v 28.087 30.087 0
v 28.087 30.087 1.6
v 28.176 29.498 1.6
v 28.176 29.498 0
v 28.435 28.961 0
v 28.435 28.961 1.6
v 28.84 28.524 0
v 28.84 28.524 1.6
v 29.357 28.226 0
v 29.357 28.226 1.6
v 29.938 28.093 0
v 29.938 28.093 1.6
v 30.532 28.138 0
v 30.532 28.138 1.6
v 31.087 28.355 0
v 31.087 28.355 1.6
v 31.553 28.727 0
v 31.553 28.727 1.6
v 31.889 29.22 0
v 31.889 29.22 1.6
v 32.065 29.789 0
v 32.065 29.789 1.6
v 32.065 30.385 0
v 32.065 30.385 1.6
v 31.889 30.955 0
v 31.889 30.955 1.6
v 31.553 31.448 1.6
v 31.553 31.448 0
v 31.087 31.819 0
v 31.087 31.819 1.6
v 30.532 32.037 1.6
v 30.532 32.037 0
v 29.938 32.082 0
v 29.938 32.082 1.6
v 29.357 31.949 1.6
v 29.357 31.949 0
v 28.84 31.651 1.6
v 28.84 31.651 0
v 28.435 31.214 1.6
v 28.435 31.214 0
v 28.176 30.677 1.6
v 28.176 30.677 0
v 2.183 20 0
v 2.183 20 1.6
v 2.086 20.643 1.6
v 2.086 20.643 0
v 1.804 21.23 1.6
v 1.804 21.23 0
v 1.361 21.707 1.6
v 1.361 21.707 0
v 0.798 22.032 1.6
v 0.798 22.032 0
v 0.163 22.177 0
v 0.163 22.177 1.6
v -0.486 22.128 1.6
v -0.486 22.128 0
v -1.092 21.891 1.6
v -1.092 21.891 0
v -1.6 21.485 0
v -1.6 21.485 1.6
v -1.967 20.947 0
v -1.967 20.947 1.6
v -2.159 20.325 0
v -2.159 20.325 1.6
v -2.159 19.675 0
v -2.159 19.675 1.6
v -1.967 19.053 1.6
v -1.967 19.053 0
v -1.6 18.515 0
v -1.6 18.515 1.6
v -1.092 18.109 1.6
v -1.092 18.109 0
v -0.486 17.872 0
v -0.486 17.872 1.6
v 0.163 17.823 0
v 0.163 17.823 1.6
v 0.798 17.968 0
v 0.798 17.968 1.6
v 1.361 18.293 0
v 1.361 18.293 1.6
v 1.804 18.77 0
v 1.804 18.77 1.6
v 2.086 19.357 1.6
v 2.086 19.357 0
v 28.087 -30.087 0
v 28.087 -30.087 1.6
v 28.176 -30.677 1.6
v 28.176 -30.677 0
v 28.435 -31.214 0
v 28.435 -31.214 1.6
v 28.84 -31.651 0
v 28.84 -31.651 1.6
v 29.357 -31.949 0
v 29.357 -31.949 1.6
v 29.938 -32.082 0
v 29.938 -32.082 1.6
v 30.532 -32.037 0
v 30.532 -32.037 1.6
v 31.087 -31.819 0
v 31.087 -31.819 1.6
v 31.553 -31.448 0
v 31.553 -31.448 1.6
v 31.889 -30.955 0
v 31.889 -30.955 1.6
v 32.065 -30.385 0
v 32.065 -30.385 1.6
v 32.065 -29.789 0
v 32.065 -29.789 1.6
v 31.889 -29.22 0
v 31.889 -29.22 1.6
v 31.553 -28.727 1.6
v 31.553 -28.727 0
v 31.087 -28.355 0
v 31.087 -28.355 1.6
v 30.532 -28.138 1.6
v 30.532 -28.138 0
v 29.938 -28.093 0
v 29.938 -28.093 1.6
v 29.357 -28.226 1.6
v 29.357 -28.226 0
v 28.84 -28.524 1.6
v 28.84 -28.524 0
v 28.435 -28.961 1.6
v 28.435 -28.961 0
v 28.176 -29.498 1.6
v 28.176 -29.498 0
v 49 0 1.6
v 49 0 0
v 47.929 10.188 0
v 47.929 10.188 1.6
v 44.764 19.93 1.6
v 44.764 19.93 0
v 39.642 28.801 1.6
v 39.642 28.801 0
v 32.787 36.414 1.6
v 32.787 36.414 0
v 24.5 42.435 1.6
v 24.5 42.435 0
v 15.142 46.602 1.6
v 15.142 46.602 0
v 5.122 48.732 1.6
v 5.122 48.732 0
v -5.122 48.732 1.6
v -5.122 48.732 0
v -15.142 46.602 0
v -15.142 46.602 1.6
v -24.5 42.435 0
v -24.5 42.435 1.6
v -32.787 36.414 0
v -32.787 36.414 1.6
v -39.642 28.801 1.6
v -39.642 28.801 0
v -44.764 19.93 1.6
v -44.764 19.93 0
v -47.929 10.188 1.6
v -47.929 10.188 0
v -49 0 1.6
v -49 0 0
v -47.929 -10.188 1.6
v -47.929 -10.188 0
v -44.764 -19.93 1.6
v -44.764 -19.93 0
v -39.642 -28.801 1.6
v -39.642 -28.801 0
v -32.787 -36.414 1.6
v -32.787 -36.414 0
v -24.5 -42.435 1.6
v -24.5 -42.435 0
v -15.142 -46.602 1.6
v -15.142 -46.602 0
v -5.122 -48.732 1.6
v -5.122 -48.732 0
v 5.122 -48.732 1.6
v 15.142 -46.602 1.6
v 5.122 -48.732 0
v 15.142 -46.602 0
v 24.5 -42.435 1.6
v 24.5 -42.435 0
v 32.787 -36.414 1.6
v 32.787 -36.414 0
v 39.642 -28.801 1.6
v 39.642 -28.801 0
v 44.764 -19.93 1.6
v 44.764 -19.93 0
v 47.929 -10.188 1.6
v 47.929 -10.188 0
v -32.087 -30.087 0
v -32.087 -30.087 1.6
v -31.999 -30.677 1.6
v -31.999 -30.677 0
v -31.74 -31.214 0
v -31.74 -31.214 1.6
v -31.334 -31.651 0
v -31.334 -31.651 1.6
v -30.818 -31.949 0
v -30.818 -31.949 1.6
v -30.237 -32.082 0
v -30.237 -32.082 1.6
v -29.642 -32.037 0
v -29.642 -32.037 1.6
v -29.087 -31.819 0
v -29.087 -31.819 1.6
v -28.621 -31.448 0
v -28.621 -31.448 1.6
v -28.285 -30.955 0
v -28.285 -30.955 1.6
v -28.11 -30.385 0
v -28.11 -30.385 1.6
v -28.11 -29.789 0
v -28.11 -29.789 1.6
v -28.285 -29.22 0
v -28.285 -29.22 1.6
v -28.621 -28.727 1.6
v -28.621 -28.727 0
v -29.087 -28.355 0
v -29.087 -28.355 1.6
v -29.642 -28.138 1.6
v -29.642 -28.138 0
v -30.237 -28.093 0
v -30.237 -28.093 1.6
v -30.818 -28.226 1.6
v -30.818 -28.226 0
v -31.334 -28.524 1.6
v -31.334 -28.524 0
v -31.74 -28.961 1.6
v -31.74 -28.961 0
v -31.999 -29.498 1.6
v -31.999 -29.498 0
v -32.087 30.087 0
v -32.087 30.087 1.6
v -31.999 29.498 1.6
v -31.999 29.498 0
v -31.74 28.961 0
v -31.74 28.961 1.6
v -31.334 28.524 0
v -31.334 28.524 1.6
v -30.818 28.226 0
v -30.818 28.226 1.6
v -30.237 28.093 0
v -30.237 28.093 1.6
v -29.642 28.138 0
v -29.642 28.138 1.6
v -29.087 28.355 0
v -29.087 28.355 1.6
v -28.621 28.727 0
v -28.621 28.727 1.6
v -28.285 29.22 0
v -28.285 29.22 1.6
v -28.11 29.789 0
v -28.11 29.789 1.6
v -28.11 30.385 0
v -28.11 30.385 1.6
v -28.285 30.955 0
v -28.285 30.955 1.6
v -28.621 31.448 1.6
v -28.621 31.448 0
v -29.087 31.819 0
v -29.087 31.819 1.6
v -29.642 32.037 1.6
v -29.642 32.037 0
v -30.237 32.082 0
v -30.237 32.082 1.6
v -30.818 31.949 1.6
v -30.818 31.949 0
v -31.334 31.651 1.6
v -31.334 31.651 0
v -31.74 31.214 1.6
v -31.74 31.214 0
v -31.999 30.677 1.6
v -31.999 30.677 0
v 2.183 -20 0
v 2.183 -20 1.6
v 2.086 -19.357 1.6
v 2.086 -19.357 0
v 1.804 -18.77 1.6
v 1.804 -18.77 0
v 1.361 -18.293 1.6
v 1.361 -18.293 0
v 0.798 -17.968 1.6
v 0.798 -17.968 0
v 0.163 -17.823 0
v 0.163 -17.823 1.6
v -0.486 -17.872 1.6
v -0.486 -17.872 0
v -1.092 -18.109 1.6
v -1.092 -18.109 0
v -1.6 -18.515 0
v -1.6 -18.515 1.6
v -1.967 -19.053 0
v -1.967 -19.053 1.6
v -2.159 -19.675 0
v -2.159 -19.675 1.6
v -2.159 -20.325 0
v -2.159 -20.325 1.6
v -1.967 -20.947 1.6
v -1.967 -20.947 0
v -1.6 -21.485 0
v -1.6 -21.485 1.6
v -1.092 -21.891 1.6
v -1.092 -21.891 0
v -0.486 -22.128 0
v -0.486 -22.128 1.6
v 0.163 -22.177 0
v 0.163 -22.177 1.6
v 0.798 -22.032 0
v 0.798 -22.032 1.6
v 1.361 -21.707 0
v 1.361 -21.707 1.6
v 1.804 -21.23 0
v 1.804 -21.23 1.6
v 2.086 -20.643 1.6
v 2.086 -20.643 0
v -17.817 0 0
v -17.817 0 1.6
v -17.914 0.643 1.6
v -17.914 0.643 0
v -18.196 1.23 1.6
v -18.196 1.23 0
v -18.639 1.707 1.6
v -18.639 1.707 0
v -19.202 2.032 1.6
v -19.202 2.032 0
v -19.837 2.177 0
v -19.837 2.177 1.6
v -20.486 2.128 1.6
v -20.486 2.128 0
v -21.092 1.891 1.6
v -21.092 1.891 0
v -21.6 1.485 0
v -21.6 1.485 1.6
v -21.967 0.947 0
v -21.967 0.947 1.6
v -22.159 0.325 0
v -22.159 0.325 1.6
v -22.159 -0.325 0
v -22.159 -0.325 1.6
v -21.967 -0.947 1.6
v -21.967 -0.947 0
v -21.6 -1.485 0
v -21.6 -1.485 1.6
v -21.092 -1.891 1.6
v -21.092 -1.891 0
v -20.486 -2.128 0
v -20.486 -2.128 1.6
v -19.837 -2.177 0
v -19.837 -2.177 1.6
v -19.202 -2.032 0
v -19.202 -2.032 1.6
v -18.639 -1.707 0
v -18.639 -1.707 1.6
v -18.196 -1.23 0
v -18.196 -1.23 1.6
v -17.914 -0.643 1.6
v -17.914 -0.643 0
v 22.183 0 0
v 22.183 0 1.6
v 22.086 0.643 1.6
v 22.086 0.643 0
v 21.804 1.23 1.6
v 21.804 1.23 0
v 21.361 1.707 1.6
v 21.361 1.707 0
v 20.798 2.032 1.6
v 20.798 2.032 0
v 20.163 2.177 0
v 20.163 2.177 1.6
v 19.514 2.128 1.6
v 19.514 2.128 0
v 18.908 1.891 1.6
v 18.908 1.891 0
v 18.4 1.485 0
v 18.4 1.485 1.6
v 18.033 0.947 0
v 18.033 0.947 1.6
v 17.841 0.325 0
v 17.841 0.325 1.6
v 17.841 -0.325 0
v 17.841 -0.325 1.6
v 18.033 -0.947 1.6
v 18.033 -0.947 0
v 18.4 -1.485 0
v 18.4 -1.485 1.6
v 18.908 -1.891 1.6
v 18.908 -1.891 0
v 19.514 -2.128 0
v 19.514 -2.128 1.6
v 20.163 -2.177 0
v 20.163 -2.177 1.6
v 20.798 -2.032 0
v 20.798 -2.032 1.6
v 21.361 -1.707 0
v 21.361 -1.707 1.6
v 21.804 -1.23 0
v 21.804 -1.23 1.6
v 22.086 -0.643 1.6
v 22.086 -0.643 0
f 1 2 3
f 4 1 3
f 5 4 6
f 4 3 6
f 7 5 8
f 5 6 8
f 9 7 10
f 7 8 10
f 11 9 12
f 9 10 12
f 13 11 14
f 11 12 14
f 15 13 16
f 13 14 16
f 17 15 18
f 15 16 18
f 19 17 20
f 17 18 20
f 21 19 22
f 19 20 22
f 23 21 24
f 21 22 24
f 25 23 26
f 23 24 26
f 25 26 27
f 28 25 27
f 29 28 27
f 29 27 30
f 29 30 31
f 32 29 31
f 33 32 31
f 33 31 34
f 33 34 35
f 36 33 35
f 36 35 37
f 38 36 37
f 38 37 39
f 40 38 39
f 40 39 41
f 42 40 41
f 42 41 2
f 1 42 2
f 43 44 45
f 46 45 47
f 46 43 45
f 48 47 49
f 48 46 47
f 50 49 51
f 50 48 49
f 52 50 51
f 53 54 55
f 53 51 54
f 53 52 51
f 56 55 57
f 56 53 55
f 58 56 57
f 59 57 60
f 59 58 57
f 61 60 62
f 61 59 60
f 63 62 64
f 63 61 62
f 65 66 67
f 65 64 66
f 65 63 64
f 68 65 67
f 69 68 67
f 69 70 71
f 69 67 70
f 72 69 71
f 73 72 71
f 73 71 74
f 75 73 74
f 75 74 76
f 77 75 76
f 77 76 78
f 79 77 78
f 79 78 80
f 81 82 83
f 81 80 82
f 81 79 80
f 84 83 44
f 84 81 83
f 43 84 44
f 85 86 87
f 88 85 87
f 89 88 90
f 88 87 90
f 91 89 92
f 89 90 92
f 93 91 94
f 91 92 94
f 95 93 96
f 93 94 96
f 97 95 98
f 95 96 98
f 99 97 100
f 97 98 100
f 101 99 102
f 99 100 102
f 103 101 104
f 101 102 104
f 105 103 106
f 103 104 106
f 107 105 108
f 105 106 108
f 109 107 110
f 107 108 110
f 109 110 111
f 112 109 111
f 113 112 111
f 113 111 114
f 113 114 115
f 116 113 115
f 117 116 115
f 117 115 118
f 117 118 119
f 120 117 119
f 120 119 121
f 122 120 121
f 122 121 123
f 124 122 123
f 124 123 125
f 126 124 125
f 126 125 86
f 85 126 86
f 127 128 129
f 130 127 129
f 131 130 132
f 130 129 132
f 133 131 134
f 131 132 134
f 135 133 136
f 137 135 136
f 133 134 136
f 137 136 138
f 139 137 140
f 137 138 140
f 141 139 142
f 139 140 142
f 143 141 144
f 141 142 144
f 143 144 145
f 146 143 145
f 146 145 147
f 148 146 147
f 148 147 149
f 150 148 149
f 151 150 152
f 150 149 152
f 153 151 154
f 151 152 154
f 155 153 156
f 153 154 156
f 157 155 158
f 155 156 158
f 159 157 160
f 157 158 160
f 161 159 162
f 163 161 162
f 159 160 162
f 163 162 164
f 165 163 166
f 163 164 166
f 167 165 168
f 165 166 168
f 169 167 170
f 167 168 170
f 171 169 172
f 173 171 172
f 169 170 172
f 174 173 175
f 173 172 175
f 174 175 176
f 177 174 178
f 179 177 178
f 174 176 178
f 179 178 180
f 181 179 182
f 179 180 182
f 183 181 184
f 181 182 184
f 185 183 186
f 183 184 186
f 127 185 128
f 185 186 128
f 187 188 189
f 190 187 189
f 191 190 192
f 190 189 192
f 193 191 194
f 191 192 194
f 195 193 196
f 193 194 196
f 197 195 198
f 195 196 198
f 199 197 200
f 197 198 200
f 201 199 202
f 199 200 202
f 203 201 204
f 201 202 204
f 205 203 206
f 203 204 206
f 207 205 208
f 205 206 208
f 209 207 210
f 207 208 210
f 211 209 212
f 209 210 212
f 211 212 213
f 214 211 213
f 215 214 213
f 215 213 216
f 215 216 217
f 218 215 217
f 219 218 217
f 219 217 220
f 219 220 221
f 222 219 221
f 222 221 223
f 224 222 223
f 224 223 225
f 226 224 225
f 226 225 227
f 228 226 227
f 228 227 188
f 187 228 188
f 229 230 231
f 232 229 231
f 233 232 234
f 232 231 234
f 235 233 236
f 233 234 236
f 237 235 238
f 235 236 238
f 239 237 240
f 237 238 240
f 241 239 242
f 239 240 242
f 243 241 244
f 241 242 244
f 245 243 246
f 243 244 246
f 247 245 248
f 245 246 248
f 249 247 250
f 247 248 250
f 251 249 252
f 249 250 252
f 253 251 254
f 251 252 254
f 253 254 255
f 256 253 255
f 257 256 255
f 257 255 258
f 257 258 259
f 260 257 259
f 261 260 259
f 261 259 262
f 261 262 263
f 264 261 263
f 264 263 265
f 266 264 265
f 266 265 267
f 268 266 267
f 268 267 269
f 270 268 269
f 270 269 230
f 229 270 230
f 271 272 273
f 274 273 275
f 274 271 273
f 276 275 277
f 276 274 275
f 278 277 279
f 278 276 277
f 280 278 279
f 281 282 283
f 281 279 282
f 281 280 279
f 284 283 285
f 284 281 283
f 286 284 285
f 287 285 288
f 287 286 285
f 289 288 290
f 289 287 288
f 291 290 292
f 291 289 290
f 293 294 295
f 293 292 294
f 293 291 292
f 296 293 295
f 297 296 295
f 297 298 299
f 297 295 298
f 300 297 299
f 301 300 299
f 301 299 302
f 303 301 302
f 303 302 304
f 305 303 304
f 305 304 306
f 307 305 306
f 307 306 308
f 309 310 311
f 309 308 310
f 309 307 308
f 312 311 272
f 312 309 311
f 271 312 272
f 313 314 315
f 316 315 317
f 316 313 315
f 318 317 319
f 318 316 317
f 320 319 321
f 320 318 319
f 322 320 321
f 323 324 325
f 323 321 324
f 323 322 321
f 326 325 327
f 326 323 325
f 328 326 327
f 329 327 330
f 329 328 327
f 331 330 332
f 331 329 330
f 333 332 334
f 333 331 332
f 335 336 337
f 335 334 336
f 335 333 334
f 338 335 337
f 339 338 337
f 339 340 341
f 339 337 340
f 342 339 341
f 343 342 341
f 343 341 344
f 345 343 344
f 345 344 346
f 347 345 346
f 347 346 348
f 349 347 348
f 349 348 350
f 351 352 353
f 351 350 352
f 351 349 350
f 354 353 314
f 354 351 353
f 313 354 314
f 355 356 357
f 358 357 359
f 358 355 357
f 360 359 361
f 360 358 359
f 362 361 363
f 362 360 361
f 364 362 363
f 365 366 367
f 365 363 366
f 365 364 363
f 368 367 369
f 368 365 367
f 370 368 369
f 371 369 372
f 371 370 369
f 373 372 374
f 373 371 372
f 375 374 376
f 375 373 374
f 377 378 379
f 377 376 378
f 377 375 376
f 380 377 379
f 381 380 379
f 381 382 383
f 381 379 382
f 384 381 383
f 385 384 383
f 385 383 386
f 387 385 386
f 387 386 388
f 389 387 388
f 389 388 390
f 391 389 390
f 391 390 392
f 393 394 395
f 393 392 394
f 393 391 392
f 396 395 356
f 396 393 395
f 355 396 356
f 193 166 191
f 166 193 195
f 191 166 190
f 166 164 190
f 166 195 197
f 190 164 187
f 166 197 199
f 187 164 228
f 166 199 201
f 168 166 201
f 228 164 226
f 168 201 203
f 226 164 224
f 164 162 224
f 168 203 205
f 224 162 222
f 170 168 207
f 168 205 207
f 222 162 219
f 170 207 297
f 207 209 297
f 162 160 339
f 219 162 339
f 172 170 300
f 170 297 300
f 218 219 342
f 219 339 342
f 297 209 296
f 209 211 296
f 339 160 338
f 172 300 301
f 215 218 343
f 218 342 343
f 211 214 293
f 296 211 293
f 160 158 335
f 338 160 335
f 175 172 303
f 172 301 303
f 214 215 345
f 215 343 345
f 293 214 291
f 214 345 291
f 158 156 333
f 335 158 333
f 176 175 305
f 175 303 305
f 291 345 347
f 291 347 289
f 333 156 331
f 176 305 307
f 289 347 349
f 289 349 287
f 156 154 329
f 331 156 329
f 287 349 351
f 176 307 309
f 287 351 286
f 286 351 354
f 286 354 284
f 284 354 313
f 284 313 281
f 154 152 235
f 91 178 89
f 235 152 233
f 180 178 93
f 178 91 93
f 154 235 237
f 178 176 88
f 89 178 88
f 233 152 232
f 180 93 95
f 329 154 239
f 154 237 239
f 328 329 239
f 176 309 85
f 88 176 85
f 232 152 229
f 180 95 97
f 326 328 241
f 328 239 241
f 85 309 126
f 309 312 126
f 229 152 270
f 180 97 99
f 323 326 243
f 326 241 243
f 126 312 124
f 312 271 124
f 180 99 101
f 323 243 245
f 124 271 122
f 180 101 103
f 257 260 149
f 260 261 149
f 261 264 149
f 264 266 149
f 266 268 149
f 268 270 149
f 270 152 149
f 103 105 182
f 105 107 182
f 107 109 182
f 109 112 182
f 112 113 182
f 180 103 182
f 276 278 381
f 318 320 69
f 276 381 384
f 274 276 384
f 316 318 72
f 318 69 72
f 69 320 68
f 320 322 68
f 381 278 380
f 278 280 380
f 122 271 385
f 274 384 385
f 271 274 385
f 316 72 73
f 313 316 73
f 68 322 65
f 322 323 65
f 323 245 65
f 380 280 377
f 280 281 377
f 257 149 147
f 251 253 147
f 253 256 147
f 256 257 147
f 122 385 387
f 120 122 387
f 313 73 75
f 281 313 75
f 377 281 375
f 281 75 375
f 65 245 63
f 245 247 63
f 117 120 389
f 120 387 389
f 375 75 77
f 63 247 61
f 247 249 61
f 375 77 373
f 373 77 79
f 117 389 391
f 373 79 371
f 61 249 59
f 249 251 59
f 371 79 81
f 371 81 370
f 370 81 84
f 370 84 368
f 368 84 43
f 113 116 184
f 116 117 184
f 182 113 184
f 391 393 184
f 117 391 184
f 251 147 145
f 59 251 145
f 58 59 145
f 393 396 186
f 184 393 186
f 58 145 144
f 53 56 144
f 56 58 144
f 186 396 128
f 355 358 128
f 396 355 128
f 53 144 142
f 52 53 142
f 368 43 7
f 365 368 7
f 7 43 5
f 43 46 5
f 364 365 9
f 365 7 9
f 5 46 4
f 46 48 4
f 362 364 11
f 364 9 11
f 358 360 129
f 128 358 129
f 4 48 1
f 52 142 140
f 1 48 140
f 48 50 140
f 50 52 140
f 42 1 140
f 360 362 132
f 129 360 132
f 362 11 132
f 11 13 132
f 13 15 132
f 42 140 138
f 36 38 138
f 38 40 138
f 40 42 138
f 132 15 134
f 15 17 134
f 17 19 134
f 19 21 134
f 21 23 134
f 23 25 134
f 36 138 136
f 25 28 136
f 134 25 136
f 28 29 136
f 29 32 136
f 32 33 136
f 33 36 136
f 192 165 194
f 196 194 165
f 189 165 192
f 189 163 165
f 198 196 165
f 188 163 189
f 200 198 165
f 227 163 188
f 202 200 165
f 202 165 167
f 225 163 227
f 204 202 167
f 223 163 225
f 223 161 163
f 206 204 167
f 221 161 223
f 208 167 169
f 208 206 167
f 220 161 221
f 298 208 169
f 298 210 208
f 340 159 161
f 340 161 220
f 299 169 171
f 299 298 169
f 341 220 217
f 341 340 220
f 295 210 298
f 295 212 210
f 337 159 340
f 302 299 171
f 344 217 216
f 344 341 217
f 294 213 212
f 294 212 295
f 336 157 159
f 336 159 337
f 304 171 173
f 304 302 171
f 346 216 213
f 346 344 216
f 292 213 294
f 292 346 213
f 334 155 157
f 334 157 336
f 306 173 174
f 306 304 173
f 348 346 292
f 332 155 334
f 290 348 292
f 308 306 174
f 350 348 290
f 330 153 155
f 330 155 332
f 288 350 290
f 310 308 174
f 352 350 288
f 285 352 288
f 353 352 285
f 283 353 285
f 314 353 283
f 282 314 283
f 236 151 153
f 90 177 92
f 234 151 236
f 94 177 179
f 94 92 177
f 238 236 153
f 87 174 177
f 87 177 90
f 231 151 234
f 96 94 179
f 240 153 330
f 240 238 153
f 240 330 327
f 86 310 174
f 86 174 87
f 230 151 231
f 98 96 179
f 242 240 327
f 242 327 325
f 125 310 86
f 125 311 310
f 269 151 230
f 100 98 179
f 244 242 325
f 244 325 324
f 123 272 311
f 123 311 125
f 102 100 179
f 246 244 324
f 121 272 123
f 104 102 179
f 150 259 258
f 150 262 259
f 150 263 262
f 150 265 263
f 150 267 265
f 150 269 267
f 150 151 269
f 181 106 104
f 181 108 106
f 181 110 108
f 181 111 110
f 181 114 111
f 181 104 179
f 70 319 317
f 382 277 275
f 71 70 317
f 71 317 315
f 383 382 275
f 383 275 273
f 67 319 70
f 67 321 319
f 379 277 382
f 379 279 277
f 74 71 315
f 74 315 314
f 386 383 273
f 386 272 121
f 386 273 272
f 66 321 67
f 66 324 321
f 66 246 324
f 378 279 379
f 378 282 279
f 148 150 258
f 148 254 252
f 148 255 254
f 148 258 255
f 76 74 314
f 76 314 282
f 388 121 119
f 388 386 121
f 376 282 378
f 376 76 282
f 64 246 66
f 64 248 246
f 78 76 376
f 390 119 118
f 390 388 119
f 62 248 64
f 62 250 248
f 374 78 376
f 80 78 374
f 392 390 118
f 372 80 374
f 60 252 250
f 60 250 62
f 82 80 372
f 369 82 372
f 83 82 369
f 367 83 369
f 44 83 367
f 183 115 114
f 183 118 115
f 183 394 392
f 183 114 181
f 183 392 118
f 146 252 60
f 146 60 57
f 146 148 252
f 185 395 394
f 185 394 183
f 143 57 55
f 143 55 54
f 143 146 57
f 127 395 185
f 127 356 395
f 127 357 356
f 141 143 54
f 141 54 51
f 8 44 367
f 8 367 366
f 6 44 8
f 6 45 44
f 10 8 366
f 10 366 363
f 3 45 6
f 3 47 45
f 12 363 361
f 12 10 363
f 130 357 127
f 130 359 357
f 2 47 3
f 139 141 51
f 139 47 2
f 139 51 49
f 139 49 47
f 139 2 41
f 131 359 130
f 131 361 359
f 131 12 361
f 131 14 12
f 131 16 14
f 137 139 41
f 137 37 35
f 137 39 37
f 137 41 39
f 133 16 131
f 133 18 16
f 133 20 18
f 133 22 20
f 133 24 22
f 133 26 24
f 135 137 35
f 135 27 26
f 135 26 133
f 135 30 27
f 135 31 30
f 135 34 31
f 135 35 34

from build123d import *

# Parameters (mm, degrees)
SKETCH3_R                       = 49
BOSS_EXTRUDE1_DEPTH             = 1.6
F_4_0MM_CLEARANCE_DOWEL_HOLE1_D = 4
SKETCH7_R                       = 2.183129746
CUT_EXTRUDE1_DEPTH              = 70.314933456


with BuildPart() as part:
    # Sketch3 → Boss-Extrude1 (new body)
    with BuildSketch(Plane.XY):
        Circle(SKETCH3_R)
    extrude(amount=BOSS_EXTRUDE1_DEPTH)

    # Ø4.0mm Clearance Dowel Hole1 (through all)
    with Locations(Plane(origin=(0, 0, 0), x_dir=(1, 0, 0), z_dir=(0, 0, -1))):
        with Locations((-30.087393539, -30.08739354), (30.087393539, -30.08739354), (30.087393539, 30.087393539), (-30.08739354, 30.087393539)):
            Hole(F_4_0MM_CLEARANCE_DOWEL_HOLE1_D / 2)

    # Sketch7 → Cut-Extrude1 (cut, through all)
    with BuildSketch(Plane.XY):
        with Locations((0, 20)):
            Circle(SKETCH7_R)
        with Locations((20, 0)):
            Circle(SKETCH7_R)
        with Locations((0, -20)):
            Circle(SKETCH7_R)
        with Locations((-20, 0)):
            Circle(SKETCH7_R)
    extrude(amount=CUT_EXTRUDE1_DEPTH, mode=Mode.SUBTRACT)


solid = part.part
